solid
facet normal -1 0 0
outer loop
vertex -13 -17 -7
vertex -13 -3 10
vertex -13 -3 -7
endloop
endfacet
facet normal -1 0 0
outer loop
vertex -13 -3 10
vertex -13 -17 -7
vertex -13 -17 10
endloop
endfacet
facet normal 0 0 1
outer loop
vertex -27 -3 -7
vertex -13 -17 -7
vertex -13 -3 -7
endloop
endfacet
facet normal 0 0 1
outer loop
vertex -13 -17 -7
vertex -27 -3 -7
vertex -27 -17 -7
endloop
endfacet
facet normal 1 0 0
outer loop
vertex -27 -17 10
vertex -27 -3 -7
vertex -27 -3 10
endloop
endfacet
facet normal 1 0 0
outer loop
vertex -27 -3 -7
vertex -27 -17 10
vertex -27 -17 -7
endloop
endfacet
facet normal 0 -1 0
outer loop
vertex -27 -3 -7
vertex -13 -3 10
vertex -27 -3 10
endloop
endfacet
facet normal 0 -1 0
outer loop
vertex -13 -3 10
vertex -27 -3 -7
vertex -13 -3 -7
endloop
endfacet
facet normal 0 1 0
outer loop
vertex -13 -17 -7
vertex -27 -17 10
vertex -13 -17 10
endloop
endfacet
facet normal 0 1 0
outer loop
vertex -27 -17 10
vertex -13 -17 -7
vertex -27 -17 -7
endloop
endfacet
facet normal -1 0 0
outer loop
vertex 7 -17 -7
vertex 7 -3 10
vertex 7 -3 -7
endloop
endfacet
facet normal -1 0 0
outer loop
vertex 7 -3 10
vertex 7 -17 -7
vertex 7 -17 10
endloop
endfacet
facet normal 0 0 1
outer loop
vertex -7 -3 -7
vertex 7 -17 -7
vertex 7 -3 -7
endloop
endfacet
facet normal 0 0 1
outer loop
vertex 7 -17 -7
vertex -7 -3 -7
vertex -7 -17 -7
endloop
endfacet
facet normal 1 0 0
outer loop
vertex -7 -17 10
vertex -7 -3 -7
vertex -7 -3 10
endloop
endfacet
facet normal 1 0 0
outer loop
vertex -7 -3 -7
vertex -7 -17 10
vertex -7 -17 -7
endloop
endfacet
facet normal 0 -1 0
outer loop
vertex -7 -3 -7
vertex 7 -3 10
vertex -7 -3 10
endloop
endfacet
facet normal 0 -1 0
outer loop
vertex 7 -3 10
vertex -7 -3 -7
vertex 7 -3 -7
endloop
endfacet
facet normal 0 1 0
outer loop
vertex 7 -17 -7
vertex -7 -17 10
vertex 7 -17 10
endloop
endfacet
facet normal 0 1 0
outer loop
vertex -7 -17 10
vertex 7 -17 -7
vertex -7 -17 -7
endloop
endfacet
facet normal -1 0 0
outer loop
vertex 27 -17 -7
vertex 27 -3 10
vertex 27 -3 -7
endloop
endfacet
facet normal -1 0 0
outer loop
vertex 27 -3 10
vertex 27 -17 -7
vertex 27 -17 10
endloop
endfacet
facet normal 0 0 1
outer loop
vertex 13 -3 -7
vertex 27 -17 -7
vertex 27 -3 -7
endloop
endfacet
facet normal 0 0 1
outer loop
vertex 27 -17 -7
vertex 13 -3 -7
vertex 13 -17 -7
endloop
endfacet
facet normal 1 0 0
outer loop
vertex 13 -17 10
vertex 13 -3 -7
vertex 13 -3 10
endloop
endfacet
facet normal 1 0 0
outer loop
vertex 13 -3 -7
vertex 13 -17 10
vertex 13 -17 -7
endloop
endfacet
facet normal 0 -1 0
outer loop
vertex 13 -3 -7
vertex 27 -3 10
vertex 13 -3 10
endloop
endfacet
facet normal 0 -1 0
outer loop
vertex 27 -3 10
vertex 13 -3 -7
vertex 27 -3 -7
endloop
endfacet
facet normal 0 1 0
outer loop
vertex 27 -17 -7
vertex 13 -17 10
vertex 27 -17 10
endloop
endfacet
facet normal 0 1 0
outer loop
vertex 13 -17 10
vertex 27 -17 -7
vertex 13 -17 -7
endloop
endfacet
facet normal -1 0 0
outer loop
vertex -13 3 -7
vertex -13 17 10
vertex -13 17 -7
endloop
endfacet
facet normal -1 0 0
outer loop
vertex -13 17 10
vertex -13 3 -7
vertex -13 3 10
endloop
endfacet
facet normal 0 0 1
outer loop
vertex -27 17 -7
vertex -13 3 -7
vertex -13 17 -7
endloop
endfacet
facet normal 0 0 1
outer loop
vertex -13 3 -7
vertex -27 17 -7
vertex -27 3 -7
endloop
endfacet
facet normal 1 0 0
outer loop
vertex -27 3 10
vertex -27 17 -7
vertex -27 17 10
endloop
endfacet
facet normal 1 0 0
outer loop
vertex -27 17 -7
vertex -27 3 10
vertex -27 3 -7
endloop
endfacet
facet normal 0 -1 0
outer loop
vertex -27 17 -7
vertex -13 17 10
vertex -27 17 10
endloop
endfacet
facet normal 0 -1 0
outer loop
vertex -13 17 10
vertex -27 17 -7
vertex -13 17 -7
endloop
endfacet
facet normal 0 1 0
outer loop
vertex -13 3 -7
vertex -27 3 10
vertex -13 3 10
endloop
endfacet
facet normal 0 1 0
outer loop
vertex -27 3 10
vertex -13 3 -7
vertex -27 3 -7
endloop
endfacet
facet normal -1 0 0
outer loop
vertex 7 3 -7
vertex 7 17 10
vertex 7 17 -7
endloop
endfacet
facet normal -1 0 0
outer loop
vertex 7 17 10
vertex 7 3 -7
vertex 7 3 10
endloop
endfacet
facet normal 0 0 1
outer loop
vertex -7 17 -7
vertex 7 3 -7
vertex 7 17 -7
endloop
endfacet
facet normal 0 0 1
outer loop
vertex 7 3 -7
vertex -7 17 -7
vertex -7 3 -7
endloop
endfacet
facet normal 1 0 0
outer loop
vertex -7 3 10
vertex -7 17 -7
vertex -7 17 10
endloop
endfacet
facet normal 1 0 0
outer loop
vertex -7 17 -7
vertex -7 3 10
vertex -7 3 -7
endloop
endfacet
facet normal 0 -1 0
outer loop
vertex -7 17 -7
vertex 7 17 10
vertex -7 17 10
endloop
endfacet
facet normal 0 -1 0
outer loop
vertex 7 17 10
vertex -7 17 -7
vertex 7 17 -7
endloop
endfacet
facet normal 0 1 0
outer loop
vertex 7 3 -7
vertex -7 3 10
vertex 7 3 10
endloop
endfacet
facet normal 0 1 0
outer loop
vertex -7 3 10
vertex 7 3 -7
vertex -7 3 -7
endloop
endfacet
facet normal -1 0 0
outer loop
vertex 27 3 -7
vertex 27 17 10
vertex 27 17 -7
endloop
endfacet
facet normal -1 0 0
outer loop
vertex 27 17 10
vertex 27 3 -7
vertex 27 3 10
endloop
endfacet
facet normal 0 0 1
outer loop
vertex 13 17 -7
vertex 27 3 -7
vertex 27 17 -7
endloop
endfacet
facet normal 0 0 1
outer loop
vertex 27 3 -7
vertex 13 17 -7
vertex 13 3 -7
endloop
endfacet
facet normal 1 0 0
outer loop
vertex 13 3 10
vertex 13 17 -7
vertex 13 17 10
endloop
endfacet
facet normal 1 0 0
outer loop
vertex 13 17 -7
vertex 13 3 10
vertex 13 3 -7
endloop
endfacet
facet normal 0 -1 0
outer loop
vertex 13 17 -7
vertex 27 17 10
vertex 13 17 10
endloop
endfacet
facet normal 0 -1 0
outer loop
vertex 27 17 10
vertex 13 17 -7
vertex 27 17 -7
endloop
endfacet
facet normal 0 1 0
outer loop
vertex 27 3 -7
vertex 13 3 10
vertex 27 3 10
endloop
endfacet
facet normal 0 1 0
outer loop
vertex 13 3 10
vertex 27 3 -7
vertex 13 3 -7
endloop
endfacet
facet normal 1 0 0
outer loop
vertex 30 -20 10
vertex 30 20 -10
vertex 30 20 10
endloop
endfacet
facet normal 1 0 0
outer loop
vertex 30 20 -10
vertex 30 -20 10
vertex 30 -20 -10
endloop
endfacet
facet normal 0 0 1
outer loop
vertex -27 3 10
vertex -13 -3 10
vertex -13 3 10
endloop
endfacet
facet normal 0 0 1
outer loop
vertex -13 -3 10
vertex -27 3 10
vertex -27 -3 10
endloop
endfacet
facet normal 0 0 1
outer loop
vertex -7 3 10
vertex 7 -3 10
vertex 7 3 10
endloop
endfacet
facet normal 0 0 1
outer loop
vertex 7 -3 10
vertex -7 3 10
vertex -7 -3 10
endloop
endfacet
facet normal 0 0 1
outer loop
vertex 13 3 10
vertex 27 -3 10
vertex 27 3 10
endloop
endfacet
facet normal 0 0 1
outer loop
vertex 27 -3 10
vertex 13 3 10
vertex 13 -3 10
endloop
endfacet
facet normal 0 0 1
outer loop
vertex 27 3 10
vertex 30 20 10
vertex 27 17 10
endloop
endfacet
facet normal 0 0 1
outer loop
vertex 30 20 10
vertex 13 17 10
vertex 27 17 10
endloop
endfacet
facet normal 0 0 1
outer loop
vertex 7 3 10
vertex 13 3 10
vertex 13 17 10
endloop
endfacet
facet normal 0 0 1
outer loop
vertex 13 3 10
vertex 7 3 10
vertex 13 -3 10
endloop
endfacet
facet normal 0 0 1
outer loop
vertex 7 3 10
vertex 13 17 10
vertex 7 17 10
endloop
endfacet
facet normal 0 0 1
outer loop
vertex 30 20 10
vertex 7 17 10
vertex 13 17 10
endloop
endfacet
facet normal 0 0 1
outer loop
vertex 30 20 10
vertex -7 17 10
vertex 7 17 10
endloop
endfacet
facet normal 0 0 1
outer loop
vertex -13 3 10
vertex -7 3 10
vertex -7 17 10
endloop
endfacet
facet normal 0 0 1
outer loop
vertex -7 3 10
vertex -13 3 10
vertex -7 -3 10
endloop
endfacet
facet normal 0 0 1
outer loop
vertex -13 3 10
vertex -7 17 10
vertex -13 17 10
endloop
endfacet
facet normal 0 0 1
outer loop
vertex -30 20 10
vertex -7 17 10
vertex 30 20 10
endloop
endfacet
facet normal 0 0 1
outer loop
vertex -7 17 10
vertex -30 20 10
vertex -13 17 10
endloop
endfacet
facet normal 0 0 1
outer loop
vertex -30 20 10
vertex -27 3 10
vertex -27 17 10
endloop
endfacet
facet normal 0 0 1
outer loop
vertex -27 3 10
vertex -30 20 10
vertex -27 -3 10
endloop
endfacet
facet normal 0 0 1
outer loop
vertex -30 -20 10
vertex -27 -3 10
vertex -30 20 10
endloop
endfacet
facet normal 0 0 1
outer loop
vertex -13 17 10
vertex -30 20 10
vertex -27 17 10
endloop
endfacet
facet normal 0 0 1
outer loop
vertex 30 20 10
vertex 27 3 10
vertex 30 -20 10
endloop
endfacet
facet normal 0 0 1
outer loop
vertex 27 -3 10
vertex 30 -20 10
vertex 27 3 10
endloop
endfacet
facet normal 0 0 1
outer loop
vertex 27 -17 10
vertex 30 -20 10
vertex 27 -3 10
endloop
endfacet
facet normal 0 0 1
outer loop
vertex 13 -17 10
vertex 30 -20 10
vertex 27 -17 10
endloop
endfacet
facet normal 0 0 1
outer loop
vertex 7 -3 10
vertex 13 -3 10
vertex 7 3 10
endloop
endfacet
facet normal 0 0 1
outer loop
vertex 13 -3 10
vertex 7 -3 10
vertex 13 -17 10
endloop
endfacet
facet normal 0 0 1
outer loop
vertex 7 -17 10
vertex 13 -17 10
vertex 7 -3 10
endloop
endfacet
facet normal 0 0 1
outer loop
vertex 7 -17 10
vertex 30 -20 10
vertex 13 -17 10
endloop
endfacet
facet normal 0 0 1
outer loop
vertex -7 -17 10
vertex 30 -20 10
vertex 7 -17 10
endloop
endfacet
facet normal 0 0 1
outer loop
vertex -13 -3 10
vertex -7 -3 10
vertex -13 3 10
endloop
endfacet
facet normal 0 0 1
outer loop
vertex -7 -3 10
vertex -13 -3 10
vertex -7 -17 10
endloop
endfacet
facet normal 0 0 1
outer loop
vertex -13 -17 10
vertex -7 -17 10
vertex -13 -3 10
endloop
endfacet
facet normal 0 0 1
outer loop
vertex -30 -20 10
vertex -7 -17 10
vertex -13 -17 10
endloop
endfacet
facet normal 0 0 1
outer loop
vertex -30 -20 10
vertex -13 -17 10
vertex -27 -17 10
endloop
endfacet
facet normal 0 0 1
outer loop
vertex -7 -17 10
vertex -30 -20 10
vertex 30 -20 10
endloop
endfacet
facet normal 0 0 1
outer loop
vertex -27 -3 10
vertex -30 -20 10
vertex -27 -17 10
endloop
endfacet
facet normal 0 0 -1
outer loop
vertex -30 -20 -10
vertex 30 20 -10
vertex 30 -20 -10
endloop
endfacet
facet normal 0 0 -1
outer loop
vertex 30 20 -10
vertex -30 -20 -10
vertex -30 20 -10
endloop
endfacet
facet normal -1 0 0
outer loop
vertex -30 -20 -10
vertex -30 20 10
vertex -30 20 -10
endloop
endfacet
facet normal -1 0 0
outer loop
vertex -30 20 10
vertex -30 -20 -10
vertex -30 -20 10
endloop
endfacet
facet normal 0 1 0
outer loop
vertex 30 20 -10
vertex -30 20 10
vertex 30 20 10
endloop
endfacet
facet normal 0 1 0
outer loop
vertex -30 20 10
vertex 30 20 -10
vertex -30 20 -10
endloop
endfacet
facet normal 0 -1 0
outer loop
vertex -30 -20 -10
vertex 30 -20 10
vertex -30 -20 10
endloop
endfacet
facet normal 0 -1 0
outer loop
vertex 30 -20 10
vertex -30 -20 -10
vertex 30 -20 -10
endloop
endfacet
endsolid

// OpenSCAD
$fn = 32;

// ----------------------------------------------------------------------
// Pocket plate 60 x 40 x 20
// 2 x 3 pockets 14 mm square, 17 mm deep
// ----------------------------------------------------------------------

// --- parameters (mm) ---
thickness = 20;  // plate thickness
floor_t = 3;     // material left under each pocket
pocket = 14;     // pocket side length
pitch_x = 20;    // pocket pitch along X
pitch_y = 20;    // pocket pitch along Y
cols = 3;        // pockets per row
rows = 2;        // rows of pockets

// --- derived feature positions (mm) ---
depth = thickness - floor_t;        // = 17   pocket depth, down to the floor
span_x = (cols - 1) * pitch_x;      // = 40   distance between outer pockets
span_y = (rows - 1) * pitch_y;      // = 20   distance between outer pocket rows
origin_x = -span_x / 2;             // = -20   X of the first pocket
origin_y = -span_y / 2;             // = -10   Y of the first pocket
plate = [span_x + pocket + 6, span_y + pocket + 6, thickness];  // = [60, 40, 20]   overall size: pockets plus 3 mm of wall on each side
feature_centers = [
  [origin_x + 0 * pitch_x, origin_y + 0 * pitch_y],
  [origin_x + 1 * pitch_x, origin_y + 0 * pitch_y],
  [origin_x + 2 * pitch_x, origin_y + 0 * pitch_y],
  [origin_x + 0 * pitch_x, origin_y + 1 * pitch_y],
  [origin_x + 1 * pitch_x, origin_y + 1 * pitch_y],
  [origin_x + 2 * pitch_x, origin_y + 1 * pitch_y]
];   // pocket centres, used verbatim by the cutter loop

// plate outline, then one pocket per centre in feature_centers
difference() {
  cube(plate, center = true);
  for (centre = feature_centers)
    translate([centre[0] - pocket / 2, centre[1] - pocket / 2, plate[2] / 2 - depth])
      cube([pocket, pocket, depth + 1]);  // centred on the declared pocket centre
}
